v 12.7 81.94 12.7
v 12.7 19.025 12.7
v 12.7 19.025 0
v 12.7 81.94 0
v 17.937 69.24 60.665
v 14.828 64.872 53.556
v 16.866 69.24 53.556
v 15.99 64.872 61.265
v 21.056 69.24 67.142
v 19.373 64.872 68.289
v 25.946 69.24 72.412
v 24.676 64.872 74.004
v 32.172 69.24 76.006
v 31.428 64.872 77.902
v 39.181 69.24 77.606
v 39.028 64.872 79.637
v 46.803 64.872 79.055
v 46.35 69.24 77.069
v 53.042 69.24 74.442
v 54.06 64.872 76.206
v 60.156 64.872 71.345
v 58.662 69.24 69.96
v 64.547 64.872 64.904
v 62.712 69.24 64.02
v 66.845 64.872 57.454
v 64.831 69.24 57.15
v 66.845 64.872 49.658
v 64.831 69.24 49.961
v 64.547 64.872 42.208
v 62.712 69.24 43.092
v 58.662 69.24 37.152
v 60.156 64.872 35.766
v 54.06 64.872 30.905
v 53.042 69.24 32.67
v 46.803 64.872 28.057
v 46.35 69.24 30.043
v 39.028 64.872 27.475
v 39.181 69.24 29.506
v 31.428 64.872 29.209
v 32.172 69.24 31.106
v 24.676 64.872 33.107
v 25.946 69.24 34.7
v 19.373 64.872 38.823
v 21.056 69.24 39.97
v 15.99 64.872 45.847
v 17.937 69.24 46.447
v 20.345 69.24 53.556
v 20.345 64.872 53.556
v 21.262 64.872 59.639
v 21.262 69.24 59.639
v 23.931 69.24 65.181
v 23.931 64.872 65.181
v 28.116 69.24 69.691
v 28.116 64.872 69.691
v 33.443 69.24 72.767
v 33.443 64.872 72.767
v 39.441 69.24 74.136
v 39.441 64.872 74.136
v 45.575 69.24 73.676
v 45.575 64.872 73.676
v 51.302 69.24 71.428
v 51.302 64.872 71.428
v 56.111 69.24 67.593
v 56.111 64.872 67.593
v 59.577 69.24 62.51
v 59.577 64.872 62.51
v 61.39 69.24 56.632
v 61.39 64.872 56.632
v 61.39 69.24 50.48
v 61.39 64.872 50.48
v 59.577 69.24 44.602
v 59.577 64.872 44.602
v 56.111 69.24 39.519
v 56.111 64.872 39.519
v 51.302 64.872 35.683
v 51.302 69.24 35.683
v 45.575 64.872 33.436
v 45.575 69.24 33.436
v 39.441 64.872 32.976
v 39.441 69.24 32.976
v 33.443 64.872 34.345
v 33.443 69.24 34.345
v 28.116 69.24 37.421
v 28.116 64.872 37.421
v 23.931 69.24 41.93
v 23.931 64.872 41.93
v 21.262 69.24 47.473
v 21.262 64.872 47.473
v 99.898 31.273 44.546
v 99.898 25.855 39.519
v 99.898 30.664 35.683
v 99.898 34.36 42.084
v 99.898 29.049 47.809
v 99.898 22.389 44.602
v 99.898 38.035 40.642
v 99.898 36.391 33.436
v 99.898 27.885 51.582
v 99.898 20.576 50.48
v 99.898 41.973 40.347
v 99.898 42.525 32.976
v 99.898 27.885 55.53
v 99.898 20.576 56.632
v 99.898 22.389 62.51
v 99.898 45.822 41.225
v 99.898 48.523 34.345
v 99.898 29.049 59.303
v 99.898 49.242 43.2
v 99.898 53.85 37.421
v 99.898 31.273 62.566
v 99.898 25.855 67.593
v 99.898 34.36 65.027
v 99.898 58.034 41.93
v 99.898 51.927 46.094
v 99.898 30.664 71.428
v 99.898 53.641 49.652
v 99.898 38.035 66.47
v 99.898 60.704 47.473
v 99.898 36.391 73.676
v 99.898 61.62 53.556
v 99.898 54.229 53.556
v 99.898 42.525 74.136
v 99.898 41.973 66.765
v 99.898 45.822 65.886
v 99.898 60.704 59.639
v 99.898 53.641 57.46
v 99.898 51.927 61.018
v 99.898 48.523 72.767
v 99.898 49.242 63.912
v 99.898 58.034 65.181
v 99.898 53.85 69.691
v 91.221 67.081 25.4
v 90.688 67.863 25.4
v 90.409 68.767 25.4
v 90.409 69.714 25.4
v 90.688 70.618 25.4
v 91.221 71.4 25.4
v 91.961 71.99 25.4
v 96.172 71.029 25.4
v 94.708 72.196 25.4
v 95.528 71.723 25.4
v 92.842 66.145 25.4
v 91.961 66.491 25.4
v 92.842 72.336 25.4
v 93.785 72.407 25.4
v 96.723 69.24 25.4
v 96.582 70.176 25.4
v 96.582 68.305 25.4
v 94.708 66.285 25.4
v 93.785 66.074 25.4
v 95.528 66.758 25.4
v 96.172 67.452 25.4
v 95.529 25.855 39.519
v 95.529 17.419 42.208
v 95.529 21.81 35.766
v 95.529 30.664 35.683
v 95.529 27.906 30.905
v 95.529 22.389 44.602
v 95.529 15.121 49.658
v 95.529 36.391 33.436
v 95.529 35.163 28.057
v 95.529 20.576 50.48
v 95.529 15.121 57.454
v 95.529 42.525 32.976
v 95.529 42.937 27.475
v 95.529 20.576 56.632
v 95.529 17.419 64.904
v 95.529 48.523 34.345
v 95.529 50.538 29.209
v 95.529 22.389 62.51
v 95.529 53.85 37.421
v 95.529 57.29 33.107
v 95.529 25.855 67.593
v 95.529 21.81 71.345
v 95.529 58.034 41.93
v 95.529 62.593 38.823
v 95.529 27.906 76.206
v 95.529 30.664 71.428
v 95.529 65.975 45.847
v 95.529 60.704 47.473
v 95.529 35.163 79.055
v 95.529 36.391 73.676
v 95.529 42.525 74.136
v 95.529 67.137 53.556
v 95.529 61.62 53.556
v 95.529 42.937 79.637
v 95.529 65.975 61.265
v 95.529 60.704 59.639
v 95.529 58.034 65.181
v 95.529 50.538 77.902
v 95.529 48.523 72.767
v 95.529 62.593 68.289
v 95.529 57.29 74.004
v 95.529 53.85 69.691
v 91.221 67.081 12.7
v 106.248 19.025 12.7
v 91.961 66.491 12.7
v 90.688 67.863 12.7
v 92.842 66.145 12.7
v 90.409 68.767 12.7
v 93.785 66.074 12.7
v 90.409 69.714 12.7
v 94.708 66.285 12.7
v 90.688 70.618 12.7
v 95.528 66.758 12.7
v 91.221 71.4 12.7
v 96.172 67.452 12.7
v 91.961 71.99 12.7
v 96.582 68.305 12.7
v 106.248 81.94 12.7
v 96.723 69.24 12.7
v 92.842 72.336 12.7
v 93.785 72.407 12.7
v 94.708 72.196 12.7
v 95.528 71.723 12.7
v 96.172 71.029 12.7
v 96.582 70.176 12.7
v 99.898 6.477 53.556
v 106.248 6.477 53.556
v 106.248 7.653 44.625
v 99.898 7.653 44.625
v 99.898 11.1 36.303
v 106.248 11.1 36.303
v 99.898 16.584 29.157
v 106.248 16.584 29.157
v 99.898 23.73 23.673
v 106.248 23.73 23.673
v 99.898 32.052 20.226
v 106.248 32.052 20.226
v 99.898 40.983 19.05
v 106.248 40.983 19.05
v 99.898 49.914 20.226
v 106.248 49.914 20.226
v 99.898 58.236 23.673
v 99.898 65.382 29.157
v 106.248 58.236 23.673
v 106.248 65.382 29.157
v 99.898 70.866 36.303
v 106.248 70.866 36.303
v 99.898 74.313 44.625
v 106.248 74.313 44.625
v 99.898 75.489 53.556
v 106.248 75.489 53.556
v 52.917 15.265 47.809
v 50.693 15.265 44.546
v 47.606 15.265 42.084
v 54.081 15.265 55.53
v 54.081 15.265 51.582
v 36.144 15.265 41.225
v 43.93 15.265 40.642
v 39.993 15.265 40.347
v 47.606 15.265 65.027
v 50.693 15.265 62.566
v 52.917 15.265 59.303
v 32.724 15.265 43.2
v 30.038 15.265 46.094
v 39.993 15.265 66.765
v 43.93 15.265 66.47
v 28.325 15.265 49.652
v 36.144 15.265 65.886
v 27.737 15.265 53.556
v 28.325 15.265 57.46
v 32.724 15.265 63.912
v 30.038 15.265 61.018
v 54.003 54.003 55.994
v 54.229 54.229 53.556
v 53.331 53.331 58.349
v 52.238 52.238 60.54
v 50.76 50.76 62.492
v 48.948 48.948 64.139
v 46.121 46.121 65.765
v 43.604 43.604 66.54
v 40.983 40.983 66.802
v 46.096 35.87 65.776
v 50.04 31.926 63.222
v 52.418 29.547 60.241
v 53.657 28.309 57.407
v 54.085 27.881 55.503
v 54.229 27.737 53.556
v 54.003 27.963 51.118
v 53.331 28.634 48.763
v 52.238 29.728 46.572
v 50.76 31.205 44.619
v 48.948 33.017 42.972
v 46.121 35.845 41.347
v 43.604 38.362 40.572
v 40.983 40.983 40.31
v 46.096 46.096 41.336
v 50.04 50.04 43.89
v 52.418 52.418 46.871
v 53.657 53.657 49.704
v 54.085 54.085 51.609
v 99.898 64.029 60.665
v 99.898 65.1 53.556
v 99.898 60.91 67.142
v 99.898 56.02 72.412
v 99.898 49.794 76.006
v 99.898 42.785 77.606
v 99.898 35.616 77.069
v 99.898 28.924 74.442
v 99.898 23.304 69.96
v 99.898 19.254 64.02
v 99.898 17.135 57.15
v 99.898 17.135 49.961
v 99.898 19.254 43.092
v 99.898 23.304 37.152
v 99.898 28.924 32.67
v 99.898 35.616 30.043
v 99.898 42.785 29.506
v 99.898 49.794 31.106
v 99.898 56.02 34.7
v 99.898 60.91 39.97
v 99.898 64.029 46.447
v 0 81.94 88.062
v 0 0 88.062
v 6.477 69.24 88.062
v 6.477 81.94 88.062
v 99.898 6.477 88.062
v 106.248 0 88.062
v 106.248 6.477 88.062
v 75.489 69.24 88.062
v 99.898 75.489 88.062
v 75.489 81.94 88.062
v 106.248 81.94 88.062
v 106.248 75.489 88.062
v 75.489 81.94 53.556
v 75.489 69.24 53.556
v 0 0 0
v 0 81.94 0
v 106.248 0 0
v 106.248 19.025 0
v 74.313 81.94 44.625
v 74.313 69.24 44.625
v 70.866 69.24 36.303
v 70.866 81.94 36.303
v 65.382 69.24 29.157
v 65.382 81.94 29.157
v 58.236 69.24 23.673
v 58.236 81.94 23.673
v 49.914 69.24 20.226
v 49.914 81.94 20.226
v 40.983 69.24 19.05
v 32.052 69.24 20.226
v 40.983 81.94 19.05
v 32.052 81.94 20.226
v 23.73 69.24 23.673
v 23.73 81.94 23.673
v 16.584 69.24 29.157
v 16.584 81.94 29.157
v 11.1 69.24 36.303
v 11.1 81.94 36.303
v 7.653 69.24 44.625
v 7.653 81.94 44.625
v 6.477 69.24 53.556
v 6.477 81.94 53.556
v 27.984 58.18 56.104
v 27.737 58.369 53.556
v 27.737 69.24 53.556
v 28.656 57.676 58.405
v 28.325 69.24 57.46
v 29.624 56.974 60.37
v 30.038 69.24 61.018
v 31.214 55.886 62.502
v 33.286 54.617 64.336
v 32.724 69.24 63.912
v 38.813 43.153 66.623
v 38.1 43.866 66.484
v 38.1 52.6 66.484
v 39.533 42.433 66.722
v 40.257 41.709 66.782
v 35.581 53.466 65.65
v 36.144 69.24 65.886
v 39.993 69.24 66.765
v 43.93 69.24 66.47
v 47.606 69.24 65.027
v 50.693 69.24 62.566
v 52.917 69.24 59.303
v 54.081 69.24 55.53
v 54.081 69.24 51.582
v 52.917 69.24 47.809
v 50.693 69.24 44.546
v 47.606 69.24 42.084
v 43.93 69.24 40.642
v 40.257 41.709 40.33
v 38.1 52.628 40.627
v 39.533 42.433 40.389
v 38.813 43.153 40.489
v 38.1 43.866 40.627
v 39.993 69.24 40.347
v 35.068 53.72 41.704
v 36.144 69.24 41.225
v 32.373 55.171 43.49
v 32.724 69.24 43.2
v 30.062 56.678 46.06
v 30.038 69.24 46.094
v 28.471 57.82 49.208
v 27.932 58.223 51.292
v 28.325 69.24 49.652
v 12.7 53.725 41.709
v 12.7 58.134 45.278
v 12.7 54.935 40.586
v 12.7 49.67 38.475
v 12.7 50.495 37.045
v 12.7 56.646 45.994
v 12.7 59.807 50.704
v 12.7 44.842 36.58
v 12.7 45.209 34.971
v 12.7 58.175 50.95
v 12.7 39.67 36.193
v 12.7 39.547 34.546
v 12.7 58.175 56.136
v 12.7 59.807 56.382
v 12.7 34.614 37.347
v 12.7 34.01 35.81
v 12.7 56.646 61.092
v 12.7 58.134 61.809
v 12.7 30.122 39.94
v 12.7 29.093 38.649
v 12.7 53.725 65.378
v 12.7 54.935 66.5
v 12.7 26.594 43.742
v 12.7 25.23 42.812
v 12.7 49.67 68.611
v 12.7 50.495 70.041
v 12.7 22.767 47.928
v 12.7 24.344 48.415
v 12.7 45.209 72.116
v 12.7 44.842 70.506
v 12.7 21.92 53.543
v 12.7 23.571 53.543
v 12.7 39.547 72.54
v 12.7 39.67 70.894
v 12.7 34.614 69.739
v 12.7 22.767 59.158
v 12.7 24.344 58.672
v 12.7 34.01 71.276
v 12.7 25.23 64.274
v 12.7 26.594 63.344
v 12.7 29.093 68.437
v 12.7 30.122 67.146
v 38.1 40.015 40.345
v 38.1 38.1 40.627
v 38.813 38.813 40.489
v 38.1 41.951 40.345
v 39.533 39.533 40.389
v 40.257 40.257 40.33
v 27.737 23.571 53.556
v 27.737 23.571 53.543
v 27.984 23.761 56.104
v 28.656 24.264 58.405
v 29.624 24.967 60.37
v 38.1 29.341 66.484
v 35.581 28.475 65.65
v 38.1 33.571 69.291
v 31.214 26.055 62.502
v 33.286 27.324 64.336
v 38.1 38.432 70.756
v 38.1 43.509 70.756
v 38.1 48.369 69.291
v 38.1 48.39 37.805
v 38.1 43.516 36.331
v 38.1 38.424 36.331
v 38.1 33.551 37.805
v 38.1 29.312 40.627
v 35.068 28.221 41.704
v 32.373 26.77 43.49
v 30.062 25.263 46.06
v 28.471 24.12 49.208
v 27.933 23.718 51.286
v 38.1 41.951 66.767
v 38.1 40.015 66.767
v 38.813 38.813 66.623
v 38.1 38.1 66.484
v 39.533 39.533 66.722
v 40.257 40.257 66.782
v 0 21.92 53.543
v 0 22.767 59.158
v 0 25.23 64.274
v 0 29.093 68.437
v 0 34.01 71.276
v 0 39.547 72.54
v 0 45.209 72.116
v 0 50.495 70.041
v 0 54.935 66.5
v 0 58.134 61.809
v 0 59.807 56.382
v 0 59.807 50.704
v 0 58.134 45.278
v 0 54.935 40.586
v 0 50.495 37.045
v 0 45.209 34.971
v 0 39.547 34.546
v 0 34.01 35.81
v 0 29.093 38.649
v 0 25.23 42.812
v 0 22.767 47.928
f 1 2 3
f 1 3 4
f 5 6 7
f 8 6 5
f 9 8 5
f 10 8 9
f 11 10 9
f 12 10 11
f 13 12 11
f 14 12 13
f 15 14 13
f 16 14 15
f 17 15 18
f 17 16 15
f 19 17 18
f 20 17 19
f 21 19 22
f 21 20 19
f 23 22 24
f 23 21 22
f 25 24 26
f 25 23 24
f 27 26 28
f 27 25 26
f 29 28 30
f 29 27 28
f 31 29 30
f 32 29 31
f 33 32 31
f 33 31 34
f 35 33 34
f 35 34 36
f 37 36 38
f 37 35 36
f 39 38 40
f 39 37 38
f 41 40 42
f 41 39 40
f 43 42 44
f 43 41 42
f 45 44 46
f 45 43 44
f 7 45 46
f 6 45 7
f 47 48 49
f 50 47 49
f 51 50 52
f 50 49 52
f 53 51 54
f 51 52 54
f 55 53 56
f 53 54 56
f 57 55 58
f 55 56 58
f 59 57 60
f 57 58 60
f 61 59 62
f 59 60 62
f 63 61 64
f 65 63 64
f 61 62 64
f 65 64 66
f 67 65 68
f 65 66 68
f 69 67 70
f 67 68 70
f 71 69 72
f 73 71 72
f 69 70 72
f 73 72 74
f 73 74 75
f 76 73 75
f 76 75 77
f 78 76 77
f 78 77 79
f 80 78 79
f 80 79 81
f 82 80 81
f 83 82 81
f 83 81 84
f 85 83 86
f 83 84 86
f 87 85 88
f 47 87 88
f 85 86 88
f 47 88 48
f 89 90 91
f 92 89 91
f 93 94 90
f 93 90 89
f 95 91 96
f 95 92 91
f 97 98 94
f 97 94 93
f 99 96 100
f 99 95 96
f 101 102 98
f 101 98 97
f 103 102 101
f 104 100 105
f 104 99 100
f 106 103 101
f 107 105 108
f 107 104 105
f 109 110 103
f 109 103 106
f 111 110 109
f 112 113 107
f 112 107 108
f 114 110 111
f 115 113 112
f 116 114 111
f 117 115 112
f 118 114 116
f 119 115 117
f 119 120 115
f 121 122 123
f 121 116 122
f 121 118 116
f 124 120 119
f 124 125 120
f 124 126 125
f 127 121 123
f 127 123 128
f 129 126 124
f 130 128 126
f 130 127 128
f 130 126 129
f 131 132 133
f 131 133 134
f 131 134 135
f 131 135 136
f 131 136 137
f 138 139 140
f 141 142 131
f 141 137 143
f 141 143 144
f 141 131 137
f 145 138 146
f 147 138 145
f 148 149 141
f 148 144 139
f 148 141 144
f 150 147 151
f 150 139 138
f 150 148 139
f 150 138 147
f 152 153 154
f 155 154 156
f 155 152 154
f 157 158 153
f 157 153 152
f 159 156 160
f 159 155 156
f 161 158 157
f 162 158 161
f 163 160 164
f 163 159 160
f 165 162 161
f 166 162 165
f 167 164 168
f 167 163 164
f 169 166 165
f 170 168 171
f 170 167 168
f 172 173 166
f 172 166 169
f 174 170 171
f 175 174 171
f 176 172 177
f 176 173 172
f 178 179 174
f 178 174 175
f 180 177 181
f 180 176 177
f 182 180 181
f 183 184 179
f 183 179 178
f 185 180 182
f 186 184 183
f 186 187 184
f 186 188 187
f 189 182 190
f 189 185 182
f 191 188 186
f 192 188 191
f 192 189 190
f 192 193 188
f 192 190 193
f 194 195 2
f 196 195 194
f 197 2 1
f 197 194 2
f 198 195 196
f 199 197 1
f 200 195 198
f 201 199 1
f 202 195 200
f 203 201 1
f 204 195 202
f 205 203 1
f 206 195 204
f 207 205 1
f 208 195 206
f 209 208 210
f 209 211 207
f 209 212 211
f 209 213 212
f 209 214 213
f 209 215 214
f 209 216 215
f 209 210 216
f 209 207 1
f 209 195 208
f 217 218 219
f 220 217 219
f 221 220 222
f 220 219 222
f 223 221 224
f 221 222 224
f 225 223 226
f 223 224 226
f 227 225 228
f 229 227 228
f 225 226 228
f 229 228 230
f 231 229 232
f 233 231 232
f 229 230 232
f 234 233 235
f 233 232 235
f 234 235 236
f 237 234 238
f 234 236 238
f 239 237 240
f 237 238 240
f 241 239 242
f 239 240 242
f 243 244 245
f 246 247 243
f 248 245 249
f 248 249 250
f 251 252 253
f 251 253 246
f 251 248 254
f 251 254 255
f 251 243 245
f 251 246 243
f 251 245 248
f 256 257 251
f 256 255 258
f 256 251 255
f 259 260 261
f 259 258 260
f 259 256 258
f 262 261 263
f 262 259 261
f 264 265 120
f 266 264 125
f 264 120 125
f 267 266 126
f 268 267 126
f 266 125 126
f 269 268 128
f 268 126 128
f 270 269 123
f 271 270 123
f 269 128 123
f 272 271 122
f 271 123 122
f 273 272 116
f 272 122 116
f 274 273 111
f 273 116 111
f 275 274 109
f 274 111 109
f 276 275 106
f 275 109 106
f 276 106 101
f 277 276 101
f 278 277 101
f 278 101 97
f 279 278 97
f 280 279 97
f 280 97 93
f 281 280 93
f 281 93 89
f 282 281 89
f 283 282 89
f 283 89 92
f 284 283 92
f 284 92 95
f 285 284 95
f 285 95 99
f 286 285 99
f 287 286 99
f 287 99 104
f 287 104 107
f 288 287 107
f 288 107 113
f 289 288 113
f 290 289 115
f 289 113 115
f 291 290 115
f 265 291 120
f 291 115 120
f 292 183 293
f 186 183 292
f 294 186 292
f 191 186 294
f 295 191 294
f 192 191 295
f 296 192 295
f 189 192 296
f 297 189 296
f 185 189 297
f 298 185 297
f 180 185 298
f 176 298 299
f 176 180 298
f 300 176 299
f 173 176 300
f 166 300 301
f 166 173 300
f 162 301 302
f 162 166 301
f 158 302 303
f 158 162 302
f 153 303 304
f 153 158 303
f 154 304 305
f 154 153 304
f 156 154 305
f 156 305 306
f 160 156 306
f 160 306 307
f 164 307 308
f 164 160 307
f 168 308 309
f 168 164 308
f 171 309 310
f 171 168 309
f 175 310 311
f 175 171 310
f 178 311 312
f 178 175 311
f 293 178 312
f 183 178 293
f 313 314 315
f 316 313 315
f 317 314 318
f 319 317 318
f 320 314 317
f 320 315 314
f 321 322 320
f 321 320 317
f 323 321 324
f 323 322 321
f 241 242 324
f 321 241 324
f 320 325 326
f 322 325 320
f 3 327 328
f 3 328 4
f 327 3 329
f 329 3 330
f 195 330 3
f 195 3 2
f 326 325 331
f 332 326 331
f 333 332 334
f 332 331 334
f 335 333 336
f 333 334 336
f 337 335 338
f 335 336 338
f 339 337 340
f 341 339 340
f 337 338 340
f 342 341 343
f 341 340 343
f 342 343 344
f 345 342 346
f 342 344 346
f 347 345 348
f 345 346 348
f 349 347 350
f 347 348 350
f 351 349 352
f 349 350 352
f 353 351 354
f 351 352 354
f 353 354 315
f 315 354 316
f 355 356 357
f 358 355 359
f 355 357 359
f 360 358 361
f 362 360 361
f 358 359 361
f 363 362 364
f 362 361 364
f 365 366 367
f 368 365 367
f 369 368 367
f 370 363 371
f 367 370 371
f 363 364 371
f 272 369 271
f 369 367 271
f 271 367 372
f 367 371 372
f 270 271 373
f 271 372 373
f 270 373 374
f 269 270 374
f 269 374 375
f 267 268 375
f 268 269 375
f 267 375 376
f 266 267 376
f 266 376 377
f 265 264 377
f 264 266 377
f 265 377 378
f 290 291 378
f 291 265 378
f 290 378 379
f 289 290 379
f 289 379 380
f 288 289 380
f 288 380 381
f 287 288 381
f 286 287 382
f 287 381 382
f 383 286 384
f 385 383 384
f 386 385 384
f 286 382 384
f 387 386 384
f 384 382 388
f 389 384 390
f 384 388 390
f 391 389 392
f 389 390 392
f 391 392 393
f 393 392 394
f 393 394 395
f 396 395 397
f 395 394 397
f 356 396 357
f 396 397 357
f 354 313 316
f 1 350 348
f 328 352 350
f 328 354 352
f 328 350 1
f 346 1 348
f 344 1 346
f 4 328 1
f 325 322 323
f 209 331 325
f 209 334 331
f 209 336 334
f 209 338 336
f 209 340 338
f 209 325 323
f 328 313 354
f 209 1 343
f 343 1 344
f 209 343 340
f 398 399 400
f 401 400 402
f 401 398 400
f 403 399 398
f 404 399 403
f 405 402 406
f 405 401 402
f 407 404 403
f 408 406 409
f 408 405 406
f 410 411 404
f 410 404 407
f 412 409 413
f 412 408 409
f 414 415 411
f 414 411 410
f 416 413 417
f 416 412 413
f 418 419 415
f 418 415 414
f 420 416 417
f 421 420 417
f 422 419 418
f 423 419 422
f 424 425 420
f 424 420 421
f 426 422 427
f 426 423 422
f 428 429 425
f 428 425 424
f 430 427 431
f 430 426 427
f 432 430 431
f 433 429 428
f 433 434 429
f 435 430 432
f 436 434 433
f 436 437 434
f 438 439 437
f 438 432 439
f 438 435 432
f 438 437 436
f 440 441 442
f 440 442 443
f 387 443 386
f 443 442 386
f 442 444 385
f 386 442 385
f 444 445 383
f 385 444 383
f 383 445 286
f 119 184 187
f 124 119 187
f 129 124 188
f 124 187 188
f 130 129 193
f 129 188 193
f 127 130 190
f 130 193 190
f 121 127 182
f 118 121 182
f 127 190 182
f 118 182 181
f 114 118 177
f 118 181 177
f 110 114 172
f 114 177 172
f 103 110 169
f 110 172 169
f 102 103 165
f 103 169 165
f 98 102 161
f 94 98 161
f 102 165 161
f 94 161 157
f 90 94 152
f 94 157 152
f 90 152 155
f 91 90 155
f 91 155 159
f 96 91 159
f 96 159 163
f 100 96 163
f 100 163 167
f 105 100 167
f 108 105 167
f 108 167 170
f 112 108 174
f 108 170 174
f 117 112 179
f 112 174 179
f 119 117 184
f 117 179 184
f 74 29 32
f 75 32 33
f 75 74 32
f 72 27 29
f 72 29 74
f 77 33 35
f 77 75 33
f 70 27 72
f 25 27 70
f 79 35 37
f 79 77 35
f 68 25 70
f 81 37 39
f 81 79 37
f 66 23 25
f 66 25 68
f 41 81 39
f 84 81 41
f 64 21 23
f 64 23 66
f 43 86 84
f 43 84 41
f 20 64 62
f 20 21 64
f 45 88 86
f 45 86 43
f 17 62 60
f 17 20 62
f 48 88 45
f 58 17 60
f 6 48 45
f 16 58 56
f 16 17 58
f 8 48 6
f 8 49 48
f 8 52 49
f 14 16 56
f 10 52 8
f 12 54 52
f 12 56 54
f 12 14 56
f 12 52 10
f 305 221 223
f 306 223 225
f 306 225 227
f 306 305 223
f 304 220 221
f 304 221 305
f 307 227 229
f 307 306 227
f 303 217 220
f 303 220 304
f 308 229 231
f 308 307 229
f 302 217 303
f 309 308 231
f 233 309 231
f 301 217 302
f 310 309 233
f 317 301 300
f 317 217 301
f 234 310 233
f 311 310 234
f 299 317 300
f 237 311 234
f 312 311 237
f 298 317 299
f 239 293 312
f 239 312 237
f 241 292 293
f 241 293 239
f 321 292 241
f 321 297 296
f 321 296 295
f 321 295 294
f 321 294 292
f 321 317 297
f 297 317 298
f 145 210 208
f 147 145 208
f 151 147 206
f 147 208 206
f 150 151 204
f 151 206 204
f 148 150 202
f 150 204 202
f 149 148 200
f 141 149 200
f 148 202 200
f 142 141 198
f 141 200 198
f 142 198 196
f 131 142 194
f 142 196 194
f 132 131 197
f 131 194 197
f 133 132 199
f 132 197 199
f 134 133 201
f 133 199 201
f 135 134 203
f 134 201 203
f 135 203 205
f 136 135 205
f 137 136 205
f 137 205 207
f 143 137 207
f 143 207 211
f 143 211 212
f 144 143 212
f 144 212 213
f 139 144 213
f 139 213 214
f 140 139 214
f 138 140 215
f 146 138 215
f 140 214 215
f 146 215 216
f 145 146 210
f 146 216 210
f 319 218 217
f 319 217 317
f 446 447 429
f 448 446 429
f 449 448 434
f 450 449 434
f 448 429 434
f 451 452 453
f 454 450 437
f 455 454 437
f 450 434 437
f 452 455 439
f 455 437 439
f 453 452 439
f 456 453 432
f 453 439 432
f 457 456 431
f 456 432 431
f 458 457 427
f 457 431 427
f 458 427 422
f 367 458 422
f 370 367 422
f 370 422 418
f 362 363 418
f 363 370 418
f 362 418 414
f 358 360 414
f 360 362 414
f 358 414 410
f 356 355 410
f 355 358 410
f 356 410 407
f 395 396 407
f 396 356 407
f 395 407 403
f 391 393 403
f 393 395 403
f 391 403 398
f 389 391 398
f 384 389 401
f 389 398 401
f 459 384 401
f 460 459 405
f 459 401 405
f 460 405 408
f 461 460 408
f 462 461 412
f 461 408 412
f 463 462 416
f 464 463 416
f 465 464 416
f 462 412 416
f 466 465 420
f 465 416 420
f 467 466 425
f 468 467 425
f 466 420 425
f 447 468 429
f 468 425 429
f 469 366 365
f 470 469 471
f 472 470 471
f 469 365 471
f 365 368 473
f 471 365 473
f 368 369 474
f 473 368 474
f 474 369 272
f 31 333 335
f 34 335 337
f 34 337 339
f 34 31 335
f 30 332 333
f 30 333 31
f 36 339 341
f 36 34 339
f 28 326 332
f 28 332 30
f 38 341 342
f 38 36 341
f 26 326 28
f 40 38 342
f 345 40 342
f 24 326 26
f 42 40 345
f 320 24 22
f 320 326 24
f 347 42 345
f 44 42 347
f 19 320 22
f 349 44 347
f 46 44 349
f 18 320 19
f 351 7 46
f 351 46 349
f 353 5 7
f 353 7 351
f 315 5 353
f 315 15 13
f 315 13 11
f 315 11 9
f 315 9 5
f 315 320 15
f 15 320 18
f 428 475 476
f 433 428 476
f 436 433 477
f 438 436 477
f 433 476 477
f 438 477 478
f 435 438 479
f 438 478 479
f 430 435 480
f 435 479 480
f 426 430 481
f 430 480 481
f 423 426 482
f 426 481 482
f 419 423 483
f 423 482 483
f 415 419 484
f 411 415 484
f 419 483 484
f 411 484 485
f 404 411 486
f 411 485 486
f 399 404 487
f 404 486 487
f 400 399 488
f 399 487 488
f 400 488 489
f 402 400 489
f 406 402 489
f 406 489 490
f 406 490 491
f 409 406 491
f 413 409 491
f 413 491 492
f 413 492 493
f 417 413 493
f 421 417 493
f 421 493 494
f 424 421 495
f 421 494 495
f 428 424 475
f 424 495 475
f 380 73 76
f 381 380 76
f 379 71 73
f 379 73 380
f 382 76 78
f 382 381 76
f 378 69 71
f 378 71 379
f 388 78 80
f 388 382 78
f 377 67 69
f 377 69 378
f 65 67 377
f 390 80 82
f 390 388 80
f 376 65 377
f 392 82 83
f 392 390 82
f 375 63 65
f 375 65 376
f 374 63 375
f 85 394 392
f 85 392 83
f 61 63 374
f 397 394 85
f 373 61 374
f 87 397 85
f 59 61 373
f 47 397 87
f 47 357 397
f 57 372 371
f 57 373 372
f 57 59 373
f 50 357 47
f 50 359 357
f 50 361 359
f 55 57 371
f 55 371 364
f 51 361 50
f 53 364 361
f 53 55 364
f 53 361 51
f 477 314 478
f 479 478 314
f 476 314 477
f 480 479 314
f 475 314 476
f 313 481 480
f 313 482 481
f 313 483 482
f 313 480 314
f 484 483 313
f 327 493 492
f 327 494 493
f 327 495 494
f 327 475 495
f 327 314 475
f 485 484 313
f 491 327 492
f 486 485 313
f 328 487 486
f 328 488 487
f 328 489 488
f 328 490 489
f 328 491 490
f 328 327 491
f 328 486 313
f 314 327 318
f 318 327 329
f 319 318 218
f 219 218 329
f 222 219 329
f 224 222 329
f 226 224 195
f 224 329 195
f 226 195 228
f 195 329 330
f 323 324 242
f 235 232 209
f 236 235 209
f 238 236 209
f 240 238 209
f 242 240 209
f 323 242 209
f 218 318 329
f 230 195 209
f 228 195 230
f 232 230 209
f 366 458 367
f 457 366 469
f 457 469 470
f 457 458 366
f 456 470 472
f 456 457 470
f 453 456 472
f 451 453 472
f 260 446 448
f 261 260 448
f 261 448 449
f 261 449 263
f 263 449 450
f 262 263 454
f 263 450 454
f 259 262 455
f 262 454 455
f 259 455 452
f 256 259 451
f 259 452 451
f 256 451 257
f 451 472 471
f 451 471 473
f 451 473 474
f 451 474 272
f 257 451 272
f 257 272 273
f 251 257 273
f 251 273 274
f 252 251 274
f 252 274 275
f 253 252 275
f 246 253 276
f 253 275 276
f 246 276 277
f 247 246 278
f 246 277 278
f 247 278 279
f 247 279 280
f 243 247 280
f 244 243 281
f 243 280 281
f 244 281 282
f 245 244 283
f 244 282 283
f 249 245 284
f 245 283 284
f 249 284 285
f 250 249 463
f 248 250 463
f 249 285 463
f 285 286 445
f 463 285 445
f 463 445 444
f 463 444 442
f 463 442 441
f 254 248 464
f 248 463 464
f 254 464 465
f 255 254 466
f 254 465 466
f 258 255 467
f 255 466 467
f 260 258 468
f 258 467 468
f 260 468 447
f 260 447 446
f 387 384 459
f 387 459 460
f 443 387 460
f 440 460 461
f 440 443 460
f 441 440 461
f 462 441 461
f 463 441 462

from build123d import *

# Parameters (mm, degrees)
F0_W      = 106.2482
F0_H      = 81.9404
F1_DEPTH  = 88.0618
F2_W      = 62.9158
F2_H      = 12.7
F3_DEPTH  = 93.5482
F4_W      = 69.0118
F4_H      = 34.5059
F5_DEPTH  = 6.35
F6_W      = 69.0118
F6_H      = 34.5059
F7_DEPTH  = 12.7
F8_R      = 13.2461
F9_DEPTH  = 69.0118
F10_R     = 13.2461
F11_DEPTH = 53.975
F12_R     = 19.05
F13_DEPTH = 12.7
F14_R     = 3.175
F15_DEPTH = 12.7
F16_R     = 24.1173
F17_DEPTH = 4.3688
F17_TAPER = -25
F18_R     = 20.6375
F19_DEPTH = 4.3688
F20_R     = 13.2461
F21_DEPTH = 25.4
F23_R     = 17.399
F24_DEPTH = 25.4
F22_R     = 24.1173
F22_R_2   = 13.2461
F25_DEPTH = 4.3688
F25_TAPER = -25
F26_R     = 20.6375
F27_DEPTH = 4.3688
F28_R     = 13.2461
F29_DEPTH = 4.3688


with BuildPart() as f1:
    # F0 (on Top) → F1 (new body)
    with BuildSketch(Plane.XY):
        with Locations((53.1241, 40.9702)):
            Rectangle(F0_W, F0_H)
    extrude(amount=F1_DEPTH)

    # F2 (on face) → F3 (cut)
    with BuildSketch(Plane.YZ.offset(106.2482)):
        with Locations((50.4825, 6.35)):
            Rectangle(F2_W, F2_H)
    extrude(amount=-F3_DEPTH, mode=Mode.SUBTRACT)

    # F4 (on face) → F5 (cut)
    with BuildSketch(Plane.YZ.offset(106.2482)):
        with Locations((40.9829, 70.80885)):
            Rectangle(F4_W, F4_H)
        with BuildLine():
            Line((75.4888, 53.5559), (6.477, 53.5559))
            ThreePointArc((6.477, 53.5559), (40.9829, 19.05), (75.4888, 53.5559))
        make_face()
    extrude(amount=-F5_DEPTH, mode=Mode.SUBTRACT)

    # F6 (on face) → F7 (cut)
    with BuildSketch(Plane(origin=(0, 81.9404, 0), x_dir=(-1, 0, 0), z_dir=(0, 1, 0))):
        with Locations((-40.9829, 70.80885)):
            Rectangle(F6_W, F6_H)
        with BuildLine():
            Line((-6.477, 53.5559), (-75.4888, 53.5559))
            ThreePointArc((-75.4888, 53.5559), (-40.9829, 19.05), (-6.477, 53.5559))
        make_face()
    extrude(amount=-F7_DEPTH, mode=Mode.SUBTRACT)

    # F8 (on face) → F9 (cut)
    with BuildSketch(Plane.YZ.offset(99.8982)):
        with Locations((40.9829, 53.5559)):
            Circle(F8_R)
    extrude(amount=-F9_DEPTH, mode=Mode.SUBTRACT)

    # F10 (on face) → F11 (cut)
    with BuildSketch(Plane(origin=(0, 69.2404, 0), x_dir=(-1, 0, 0), z_dir=(0, 1, 0))):
        with Locations((-40.9829, 53.5559)):
            Circle(F10_R)
    extrude(amount=-F11_DEPTH, mode=Mode.SUBTRACT)

    # F12 (on face) → F13 (cut)
    with BuildSketch(Plane(origin=(0, 0, 0), x_dir=(0, -1, 0), z_dir=(-1, 0, 0))):
        with Locations((-40.9702, 53.5432)):
            Circle(F12_R)
    extrude(amount=-F13_DEPTH, mode=Mode.SUBTRACT)

    # F14 (on face) → F15 (cut)
    with BuildSketch(Plane(origin=(0, 0, 12.7), x_dir=(1, 0, 0), z_dir=(0, 0, -1))):
        with Locations((93.5482, -69.2404)):
            Circle(F14_R)
    extrude(amount=-F15_DEPTH, mode=Mode.SUBTRACT)

    # F16 (on face) → F17 (cut)
    with BuildSketch(Plane.YZ.offset(99.8982)):
        with Locations((40.9829, 53.5559)):
            Circle(F16_R)
    extrude(amount=-F17_DEPTH, taper=F17_TAPER, mode=Mode.SUBTRACT)

    # F18 (on face) → F19 (join)
    with BuildSketch(Plane.YZ.offset(95.5294)):
        with Locations((40.9829, 53.5559)):
            Circle(F18_R)
    extrude(amount=F19_DEPTH)

    # F20 (on face) → F21 (cut)
    with BuildSketch(Plane.YZ.offset(99.8982)):
        with Locations((40.9829, 53.5559)):
            Circle(F20_R)
    extrude(amount=-F21_DEPTH, mode=Mode.SUBTRACT)

    # F23 (on face) → F24 (cut)
    with BuildSketch(Plane(origin=(12.7, 0, 0), x_dir=(0, -1, 0), z_dir=(-1, 0, 0))):
        with Locations((-40.9702, 53.5432)):
            Circle(F23_R)
    extrude(amount=-F24_DEPTH, mode=Mode.SUBTRACT)

    # F22 (on face) → F25 (cut)
    with BuildSketch(Plane(origin=(0, 69.2404, 0), x_dir=(-1, 0, 0), z_dir=(0, 1, 0))):
        with Locations((-40.9829, 53.5559)):
            Circle(F22_R)
        with Locations((-40.9829, 53.5559)):
            Circle(F22_R_2, mode=Mode.SUBTRACT)
        with Locations((-40.9829, 53.5559)):
            Circle(F22_R)
    extrude(amount=-F25_DEPTH, taper=F25_TAPER, mode=Mode.SUBTRACT)

    # F26 (on face) → F27 (join)
    with BuildSketch(Plane(origin=(0, 64.8716, 0), x_dir=(-1, 0, 0), z_dir=(0, 1, 0))):
        with Locations((-40.9829, 53.5559)):
            Circle(F26_R)
    extrude(amount=F27_DEPTH)

    # F28 (on face) → F29 (cut, through all)
    with BuildSketch(Plane(origin=(0, 69.2404, 0), x_dir=(-1, 0, 0), z_dir=(0, 1, 0))):
        with Locations((-40.9829, 53.5559)):
            Circle(F28_R)
    extrude(amount=-F29_DEPTH, mode=Mode.SUBTRACT)


solid = f1.part
